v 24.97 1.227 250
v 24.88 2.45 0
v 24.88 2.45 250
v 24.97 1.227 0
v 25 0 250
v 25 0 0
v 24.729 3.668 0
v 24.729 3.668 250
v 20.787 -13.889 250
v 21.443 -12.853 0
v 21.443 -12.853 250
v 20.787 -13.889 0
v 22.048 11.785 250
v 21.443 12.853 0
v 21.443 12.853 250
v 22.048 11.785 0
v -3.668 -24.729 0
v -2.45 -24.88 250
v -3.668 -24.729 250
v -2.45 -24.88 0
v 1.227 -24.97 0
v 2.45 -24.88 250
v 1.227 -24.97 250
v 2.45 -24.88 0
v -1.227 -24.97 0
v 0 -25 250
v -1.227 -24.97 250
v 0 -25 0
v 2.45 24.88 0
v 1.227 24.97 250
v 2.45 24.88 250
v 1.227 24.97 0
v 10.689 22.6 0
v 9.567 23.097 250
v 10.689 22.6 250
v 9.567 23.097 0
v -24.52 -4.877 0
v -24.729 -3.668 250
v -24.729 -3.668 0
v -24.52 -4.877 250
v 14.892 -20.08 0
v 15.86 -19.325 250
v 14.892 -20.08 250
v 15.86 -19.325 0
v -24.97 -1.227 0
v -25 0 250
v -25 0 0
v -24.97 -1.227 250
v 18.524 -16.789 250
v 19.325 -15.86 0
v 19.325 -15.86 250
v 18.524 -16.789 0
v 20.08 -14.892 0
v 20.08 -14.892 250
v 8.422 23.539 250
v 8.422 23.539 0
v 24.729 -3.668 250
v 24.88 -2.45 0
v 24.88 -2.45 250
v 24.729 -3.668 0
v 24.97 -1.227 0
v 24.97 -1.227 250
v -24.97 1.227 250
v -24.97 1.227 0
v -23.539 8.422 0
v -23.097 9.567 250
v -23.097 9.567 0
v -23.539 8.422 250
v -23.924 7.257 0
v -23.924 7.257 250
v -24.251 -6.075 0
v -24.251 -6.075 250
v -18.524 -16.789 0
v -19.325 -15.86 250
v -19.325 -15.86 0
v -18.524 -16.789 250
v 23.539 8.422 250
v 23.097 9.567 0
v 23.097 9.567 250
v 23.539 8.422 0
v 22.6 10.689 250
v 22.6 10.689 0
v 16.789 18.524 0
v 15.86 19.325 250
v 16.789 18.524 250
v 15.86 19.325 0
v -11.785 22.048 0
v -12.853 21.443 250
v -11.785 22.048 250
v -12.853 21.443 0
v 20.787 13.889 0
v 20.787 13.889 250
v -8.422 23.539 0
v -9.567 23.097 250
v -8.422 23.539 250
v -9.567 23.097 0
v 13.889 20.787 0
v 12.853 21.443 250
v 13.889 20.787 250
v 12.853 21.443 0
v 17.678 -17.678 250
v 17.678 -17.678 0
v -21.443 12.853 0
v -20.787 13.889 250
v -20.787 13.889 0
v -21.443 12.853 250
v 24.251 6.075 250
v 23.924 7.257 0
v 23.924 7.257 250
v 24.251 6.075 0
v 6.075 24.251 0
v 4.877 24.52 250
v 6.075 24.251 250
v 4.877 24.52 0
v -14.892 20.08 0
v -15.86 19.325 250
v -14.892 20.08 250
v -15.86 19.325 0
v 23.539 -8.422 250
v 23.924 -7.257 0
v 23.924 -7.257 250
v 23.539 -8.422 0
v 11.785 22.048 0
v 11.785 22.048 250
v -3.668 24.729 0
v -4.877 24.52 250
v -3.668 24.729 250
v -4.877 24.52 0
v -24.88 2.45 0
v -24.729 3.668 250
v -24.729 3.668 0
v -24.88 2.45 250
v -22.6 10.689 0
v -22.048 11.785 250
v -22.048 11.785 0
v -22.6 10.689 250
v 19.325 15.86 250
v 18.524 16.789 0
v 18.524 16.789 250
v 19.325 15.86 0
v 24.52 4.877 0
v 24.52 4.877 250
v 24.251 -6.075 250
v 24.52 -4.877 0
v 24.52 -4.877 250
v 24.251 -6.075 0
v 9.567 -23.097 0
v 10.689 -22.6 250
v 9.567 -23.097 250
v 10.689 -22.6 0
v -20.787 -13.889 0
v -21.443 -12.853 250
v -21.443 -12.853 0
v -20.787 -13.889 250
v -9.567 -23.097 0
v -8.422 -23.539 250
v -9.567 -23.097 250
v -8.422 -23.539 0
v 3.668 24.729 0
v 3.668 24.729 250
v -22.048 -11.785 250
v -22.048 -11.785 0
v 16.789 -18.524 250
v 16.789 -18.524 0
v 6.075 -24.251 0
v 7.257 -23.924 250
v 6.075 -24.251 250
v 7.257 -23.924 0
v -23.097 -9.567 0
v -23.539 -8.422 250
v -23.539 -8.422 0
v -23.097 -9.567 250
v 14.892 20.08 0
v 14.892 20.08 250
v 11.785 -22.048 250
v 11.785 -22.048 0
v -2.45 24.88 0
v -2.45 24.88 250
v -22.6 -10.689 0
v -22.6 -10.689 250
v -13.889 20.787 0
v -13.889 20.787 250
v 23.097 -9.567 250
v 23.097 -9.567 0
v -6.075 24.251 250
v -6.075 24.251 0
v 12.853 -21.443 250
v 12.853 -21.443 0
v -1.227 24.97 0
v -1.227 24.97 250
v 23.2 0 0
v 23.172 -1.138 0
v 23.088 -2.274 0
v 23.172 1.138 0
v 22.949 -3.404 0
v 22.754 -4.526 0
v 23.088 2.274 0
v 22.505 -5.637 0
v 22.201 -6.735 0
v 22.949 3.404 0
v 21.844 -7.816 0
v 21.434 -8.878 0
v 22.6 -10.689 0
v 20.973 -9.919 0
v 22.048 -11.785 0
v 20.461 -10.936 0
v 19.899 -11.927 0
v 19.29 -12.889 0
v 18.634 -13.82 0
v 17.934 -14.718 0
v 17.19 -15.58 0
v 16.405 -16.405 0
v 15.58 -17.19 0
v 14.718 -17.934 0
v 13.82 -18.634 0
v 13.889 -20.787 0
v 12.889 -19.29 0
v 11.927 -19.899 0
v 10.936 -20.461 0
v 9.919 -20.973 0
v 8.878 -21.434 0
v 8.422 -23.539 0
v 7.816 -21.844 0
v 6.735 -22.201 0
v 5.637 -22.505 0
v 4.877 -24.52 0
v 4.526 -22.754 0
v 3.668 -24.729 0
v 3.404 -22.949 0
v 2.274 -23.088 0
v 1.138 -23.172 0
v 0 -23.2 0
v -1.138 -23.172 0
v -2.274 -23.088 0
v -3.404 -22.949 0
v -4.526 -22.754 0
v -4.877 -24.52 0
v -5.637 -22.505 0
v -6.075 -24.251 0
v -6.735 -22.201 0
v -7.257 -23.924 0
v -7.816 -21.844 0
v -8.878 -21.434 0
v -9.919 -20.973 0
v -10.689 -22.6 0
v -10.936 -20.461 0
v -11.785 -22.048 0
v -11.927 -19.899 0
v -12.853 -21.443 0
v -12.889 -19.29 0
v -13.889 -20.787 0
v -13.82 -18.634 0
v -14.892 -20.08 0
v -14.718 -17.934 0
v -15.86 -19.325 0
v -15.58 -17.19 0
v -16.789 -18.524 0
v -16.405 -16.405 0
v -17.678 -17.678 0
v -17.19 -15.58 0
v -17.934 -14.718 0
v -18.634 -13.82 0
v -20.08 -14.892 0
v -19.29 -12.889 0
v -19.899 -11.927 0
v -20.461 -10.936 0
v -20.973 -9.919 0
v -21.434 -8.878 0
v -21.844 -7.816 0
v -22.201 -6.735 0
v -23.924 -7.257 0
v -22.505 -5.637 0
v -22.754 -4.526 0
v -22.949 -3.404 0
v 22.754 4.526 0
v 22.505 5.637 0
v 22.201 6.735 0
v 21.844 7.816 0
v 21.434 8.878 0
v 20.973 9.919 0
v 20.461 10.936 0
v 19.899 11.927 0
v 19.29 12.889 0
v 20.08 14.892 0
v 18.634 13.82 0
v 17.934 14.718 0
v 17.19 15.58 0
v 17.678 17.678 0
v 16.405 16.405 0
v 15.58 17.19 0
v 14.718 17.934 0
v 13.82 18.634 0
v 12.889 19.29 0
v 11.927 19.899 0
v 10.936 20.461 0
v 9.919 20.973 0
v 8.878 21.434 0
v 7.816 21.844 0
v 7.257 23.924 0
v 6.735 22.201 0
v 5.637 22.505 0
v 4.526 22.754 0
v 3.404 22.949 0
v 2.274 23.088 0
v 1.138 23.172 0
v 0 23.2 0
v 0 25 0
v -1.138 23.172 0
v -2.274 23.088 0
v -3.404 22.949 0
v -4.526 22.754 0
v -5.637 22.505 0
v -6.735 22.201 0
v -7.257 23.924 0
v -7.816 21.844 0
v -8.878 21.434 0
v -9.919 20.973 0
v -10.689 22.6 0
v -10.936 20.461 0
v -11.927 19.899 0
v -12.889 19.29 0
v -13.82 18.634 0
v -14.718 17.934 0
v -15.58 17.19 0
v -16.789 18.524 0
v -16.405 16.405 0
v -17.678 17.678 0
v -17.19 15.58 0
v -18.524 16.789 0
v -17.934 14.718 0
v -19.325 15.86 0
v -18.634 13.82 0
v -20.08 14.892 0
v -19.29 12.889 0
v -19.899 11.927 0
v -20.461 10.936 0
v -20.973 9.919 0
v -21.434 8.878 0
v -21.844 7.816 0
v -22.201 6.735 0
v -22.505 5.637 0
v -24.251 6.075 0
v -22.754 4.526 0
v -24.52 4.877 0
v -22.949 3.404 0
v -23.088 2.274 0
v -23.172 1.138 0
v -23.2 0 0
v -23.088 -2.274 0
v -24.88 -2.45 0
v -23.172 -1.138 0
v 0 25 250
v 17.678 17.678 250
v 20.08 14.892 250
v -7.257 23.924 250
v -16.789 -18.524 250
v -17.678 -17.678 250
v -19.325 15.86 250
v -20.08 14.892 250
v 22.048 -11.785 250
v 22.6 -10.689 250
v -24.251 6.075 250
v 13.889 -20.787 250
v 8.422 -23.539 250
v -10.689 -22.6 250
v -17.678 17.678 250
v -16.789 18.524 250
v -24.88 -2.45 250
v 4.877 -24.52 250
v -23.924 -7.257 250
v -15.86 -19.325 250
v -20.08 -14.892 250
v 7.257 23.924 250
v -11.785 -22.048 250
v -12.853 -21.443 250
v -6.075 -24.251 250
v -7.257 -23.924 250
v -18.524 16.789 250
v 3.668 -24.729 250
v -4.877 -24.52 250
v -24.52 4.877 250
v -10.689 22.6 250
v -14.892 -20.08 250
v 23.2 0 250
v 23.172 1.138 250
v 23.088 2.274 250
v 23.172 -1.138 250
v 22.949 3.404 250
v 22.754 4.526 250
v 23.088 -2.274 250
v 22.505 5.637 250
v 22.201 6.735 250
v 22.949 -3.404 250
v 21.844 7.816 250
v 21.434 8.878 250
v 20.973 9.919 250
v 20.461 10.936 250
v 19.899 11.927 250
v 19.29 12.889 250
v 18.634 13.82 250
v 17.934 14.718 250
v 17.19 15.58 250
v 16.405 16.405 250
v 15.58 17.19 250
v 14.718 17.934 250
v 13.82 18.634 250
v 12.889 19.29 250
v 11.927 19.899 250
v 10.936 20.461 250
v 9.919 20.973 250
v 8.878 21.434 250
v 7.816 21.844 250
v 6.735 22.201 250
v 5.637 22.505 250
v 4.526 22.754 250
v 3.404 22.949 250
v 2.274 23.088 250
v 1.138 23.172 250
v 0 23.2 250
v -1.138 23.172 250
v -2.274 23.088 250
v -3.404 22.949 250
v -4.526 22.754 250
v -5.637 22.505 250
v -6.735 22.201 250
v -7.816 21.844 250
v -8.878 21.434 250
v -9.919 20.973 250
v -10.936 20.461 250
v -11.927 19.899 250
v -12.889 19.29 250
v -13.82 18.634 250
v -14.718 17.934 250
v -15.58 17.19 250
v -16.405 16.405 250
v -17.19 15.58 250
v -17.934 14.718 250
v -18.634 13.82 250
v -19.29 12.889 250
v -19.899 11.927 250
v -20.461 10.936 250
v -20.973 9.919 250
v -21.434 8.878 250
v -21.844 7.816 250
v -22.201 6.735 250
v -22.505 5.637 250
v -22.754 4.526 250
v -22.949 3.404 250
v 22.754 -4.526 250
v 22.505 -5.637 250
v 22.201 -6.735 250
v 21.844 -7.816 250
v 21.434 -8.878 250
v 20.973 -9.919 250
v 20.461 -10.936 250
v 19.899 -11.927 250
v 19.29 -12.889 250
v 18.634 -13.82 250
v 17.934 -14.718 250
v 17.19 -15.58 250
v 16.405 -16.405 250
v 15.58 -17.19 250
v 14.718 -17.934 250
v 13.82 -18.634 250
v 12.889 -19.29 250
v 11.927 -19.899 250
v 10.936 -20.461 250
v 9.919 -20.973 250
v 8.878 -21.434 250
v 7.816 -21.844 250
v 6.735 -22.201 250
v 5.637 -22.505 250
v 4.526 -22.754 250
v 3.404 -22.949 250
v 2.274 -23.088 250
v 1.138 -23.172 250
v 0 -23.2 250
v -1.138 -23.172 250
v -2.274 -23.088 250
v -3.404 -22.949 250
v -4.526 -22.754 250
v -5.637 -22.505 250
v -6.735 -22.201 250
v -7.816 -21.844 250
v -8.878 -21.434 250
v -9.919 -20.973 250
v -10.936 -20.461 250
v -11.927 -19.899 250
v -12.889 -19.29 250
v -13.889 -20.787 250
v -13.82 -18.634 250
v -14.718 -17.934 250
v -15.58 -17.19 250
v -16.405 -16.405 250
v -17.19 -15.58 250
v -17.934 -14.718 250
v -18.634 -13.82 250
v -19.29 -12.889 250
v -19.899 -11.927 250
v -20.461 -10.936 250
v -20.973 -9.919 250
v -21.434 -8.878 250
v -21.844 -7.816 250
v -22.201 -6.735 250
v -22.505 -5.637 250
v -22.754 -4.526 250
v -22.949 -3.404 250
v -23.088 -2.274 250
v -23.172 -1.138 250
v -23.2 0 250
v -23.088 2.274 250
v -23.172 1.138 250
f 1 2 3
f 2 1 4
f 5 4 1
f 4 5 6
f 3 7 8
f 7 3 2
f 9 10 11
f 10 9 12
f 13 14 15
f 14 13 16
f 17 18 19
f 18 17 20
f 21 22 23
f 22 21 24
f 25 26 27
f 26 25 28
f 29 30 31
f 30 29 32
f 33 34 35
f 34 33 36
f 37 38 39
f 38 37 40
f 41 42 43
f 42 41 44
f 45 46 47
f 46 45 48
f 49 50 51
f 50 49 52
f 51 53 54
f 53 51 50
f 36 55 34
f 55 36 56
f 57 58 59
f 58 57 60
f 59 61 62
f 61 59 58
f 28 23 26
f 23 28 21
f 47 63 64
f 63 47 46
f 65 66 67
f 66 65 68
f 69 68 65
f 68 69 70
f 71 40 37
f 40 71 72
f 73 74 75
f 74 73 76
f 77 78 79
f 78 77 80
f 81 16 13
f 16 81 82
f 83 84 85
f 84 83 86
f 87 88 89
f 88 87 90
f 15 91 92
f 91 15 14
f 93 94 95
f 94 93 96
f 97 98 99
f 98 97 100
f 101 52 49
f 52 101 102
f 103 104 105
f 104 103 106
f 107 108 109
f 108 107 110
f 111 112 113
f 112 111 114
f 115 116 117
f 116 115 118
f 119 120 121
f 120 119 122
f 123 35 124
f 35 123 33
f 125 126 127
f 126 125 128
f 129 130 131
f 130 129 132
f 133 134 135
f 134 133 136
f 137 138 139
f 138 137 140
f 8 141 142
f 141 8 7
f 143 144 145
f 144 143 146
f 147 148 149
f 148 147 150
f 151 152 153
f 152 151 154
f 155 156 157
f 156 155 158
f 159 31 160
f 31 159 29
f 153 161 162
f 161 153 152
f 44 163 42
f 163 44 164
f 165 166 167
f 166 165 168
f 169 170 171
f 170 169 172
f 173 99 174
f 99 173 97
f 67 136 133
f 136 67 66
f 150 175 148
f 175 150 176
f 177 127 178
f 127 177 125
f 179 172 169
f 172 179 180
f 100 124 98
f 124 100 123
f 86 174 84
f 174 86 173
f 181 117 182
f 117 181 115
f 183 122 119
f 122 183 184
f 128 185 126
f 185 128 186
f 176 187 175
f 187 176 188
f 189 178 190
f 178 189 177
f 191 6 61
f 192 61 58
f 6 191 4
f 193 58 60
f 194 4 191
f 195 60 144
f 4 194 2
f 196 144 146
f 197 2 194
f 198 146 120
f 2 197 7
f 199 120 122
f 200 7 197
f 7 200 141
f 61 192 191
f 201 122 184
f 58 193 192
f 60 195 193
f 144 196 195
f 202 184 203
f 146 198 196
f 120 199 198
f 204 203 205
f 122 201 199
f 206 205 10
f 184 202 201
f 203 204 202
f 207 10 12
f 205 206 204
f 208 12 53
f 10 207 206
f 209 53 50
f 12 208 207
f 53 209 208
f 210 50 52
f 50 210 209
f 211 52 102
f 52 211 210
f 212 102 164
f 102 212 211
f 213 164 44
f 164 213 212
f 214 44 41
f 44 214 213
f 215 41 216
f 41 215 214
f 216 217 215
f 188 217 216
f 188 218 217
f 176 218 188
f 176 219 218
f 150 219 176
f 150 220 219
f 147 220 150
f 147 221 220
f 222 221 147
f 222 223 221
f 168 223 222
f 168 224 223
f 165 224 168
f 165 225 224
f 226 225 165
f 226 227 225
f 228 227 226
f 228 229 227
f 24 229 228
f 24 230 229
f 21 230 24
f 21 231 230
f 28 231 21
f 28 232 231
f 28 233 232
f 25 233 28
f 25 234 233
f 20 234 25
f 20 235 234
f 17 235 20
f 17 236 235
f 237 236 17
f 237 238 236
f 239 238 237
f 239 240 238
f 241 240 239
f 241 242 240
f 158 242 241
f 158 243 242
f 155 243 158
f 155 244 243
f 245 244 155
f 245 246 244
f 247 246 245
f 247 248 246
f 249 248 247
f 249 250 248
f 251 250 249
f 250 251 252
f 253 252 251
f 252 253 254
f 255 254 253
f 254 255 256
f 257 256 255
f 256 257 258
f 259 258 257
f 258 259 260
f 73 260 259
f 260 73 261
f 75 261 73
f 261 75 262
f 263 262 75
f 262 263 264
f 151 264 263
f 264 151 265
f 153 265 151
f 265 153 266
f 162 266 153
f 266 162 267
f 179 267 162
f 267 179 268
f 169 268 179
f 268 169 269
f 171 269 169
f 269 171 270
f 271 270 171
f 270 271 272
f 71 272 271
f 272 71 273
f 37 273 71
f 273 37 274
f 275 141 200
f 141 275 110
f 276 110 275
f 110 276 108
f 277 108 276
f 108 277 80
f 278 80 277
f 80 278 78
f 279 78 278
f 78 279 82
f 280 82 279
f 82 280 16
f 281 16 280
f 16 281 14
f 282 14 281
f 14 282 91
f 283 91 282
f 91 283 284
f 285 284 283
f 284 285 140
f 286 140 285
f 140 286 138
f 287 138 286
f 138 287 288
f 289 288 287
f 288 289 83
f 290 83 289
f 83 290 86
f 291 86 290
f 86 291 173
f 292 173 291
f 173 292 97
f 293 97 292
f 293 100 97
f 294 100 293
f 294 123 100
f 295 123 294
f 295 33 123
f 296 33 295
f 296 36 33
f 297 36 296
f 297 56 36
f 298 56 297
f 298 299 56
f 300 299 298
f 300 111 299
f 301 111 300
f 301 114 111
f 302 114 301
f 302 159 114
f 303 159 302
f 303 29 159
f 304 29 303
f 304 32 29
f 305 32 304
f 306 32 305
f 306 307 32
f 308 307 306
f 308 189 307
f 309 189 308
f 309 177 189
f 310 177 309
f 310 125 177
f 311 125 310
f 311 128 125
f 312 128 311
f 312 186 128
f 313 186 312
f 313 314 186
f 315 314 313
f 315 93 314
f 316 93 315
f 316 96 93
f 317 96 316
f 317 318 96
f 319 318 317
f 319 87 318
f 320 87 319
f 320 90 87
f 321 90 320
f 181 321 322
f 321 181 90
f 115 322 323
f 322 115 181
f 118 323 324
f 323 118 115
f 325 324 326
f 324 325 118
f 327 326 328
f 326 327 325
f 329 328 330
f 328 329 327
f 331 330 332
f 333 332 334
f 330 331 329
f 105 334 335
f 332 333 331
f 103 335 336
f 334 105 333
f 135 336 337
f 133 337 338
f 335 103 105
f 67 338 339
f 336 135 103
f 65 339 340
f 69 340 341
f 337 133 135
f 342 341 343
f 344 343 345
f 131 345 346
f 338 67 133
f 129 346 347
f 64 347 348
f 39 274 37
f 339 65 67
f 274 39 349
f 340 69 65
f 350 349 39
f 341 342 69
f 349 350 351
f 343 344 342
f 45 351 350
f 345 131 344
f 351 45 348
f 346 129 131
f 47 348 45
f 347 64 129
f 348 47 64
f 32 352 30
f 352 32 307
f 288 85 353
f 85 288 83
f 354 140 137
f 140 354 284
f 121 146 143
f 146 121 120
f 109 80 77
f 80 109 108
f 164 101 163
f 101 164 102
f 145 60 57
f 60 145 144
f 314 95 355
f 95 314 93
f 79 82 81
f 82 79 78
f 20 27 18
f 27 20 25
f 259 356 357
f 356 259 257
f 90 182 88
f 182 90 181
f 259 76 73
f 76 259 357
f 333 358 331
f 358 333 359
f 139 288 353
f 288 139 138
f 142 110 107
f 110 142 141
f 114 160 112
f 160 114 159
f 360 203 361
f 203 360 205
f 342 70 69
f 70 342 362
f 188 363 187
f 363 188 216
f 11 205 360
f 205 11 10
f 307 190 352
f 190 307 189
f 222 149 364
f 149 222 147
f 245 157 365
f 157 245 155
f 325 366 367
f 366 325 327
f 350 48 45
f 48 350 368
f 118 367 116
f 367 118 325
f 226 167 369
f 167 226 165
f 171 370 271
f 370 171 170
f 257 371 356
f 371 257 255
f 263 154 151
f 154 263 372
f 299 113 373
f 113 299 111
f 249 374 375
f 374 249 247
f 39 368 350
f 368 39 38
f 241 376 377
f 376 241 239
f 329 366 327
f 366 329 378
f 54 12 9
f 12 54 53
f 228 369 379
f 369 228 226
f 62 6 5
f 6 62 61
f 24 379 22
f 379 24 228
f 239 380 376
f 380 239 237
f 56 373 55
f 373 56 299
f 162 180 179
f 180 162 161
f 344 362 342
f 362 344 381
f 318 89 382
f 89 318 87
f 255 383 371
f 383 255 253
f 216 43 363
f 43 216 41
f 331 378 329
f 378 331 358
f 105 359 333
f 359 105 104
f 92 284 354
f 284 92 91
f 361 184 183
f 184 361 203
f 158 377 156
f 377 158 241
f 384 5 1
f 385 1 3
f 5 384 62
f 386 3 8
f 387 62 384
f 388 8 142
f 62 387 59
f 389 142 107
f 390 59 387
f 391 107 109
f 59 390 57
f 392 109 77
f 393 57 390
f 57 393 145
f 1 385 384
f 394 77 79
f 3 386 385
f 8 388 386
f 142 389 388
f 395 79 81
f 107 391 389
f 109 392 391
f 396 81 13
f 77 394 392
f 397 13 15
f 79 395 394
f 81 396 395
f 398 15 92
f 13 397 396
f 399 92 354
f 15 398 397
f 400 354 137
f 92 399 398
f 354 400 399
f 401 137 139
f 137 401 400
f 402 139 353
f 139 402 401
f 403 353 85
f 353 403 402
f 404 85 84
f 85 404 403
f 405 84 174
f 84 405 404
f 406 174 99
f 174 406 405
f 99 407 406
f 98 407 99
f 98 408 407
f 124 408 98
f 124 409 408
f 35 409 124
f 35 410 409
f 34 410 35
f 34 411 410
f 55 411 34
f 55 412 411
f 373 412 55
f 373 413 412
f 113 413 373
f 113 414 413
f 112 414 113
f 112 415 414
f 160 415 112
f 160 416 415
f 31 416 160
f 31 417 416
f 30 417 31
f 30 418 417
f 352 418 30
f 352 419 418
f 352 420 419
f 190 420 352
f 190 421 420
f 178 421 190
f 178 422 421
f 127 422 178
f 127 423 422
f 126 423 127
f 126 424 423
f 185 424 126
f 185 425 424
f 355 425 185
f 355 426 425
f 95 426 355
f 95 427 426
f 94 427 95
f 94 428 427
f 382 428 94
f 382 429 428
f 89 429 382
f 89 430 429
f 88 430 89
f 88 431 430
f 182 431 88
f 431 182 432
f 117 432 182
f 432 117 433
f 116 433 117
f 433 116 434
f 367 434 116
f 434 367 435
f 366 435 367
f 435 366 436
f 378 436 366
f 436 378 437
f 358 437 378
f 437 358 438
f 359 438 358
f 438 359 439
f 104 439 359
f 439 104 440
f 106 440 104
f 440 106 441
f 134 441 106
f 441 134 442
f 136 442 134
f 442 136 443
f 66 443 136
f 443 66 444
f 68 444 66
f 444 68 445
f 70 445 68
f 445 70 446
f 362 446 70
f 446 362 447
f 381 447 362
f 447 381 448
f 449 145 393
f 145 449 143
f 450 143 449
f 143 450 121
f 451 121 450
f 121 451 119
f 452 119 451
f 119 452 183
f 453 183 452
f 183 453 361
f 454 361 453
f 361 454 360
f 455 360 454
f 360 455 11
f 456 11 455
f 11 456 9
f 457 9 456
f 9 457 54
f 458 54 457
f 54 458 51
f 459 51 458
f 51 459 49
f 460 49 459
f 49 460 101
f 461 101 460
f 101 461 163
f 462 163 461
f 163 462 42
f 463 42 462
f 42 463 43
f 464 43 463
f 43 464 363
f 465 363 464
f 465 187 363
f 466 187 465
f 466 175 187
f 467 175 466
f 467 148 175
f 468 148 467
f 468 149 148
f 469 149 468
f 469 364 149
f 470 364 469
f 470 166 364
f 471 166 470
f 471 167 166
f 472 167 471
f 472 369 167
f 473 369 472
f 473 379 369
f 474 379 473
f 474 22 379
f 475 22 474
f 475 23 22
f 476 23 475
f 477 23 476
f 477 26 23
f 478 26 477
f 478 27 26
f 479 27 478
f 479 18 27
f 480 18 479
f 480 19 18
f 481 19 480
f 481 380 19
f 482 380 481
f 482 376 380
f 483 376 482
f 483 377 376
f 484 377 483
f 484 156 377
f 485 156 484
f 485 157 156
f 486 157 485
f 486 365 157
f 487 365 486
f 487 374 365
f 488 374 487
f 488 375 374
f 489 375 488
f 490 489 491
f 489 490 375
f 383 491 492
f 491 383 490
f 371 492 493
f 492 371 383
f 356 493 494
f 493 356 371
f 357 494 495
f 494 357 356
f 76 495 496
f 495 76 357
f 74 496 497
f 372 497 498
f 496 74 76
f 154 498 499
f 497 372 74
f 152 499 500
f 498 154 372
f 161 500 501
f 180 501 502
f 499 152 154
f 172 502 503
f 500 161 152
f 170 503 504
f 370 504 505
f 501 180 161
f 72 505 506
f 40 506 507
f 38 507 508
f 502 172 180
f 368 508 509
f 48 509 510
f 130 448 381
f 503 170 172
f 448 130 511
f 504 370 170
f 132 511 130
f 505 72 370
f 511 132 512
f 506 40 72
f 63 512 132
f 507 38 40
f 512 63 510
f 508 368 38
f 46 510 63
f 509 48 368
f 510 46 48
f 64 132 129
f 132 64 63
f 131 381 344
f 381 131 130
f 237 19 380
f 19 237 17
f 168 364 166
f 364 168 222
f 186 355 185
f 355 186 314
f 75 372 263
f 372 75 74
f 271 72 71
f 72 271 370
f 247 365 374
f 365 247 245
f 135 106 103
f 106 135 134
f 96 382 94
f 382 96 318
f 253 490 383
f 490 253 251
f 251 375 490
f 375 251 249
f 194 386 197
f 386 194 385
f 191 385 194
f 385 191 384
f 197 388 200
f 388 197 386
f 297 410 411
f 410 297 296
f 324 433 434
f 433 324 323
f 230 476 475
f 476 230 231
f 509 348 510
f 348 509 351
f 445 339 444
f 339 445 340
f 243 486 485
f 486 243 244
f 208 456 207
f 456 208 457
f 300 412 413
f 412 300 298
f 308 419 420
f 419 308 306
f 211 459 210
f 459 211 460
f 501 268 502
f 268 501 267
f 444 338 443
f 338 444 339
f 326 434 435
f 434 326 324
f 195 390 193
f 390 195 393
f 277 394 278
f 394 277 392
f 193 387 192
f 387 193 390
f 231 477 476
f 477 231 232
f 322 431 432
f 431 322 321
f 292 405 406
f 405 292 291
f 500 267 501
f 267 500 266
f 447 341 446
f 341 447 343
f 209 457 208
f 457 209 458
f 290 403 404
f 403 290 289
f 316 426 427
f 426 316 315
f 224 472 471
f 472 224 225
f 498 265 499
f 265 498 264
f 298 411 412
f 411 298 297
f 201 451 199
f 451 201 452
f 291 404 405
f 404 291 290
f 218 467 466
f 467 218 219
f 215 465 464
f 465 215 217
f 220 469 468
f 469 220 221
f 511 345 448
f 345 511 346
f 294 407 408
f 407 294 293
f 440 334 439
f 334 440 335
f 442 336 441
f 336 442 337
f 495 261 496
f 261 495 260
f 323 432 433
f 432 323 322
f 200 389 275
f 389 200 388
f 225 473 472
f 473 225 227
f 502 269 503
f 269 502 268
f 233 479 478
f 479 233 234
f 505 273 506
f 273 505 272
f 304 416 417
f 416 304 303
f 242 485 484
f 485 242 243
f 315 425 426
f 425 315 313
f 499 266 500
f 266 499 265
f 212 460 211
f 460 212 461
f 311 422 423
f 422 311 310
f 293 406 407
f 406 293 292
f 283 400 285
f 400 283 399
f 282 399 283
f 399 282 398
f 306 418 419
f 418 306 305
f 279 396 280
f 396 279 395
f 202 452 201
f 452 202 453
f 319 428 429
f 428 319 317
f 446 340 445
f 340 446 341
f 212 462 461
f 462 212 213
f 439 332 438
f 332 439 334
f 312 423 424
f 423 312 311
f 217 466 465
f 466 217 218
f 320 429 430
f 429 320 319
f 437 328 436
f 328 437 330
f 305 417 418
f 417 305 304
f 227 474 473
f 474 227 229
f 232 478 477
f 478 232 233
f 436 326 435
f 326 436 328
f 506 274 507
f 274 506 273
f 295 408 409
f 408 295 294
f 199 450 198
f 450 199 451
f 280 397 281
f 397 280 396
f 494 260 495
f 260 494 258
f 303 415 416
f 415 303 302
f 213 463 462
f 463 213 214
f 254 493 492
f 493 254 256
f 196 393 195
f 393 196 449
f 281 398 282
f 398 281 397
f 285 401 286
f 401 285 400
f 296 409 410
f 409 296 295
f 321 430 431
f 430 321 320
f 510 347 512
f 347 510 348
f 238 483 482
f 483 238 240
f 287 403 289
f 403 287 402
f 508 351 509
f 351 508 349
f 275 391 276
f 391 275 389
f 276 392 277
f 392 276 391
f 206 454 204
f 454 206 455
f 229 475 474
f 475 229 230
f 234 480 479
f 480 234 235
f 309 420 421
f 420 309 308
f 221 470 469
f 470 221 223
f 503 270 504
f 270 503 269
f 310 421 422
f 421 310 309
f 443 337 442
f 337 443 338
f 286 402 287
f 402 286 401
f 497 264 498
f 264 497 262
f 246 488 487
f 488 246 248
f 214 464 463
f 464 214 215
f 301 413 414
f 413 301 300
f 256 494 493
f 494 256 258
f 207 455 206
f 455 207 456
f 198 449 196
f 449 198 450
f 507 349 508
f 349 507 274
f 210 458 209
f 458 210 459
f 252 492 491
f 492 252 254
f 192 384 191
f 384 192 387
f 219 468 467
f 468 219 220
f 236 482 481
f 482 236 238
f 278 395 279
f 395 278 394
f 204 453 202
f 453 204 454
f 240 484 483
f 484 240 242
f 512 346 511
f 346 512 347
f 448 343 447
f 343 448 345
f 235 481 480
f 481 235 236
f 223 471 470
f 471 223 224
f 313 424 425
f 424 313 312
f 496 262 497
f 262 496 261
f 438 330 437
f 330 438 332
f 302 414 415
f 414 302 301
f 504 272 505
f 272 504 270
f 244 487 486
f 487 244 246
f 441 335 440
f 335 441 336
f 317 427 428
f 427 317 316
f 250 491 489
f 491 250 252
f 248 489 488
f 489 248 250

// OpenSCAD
$fn = 128;

// HT pipe parameters (approx. for HT 50)
outer_d = 50;          // mm (nominal outer diameter)
wall = 1.8;            // mm (typical HT wall thickness)
inner_d = outer_d - 2*wall;

length = 250;          // mm

module ht_pipe(od, id, h) {
    difference() {
        cylinder(h = h, d = od);
        translate([0,0,-0.5])
            cylinder(h = h + 1, d = id);
    }
}

ht_pipe(outer_d, inner_d, length);
